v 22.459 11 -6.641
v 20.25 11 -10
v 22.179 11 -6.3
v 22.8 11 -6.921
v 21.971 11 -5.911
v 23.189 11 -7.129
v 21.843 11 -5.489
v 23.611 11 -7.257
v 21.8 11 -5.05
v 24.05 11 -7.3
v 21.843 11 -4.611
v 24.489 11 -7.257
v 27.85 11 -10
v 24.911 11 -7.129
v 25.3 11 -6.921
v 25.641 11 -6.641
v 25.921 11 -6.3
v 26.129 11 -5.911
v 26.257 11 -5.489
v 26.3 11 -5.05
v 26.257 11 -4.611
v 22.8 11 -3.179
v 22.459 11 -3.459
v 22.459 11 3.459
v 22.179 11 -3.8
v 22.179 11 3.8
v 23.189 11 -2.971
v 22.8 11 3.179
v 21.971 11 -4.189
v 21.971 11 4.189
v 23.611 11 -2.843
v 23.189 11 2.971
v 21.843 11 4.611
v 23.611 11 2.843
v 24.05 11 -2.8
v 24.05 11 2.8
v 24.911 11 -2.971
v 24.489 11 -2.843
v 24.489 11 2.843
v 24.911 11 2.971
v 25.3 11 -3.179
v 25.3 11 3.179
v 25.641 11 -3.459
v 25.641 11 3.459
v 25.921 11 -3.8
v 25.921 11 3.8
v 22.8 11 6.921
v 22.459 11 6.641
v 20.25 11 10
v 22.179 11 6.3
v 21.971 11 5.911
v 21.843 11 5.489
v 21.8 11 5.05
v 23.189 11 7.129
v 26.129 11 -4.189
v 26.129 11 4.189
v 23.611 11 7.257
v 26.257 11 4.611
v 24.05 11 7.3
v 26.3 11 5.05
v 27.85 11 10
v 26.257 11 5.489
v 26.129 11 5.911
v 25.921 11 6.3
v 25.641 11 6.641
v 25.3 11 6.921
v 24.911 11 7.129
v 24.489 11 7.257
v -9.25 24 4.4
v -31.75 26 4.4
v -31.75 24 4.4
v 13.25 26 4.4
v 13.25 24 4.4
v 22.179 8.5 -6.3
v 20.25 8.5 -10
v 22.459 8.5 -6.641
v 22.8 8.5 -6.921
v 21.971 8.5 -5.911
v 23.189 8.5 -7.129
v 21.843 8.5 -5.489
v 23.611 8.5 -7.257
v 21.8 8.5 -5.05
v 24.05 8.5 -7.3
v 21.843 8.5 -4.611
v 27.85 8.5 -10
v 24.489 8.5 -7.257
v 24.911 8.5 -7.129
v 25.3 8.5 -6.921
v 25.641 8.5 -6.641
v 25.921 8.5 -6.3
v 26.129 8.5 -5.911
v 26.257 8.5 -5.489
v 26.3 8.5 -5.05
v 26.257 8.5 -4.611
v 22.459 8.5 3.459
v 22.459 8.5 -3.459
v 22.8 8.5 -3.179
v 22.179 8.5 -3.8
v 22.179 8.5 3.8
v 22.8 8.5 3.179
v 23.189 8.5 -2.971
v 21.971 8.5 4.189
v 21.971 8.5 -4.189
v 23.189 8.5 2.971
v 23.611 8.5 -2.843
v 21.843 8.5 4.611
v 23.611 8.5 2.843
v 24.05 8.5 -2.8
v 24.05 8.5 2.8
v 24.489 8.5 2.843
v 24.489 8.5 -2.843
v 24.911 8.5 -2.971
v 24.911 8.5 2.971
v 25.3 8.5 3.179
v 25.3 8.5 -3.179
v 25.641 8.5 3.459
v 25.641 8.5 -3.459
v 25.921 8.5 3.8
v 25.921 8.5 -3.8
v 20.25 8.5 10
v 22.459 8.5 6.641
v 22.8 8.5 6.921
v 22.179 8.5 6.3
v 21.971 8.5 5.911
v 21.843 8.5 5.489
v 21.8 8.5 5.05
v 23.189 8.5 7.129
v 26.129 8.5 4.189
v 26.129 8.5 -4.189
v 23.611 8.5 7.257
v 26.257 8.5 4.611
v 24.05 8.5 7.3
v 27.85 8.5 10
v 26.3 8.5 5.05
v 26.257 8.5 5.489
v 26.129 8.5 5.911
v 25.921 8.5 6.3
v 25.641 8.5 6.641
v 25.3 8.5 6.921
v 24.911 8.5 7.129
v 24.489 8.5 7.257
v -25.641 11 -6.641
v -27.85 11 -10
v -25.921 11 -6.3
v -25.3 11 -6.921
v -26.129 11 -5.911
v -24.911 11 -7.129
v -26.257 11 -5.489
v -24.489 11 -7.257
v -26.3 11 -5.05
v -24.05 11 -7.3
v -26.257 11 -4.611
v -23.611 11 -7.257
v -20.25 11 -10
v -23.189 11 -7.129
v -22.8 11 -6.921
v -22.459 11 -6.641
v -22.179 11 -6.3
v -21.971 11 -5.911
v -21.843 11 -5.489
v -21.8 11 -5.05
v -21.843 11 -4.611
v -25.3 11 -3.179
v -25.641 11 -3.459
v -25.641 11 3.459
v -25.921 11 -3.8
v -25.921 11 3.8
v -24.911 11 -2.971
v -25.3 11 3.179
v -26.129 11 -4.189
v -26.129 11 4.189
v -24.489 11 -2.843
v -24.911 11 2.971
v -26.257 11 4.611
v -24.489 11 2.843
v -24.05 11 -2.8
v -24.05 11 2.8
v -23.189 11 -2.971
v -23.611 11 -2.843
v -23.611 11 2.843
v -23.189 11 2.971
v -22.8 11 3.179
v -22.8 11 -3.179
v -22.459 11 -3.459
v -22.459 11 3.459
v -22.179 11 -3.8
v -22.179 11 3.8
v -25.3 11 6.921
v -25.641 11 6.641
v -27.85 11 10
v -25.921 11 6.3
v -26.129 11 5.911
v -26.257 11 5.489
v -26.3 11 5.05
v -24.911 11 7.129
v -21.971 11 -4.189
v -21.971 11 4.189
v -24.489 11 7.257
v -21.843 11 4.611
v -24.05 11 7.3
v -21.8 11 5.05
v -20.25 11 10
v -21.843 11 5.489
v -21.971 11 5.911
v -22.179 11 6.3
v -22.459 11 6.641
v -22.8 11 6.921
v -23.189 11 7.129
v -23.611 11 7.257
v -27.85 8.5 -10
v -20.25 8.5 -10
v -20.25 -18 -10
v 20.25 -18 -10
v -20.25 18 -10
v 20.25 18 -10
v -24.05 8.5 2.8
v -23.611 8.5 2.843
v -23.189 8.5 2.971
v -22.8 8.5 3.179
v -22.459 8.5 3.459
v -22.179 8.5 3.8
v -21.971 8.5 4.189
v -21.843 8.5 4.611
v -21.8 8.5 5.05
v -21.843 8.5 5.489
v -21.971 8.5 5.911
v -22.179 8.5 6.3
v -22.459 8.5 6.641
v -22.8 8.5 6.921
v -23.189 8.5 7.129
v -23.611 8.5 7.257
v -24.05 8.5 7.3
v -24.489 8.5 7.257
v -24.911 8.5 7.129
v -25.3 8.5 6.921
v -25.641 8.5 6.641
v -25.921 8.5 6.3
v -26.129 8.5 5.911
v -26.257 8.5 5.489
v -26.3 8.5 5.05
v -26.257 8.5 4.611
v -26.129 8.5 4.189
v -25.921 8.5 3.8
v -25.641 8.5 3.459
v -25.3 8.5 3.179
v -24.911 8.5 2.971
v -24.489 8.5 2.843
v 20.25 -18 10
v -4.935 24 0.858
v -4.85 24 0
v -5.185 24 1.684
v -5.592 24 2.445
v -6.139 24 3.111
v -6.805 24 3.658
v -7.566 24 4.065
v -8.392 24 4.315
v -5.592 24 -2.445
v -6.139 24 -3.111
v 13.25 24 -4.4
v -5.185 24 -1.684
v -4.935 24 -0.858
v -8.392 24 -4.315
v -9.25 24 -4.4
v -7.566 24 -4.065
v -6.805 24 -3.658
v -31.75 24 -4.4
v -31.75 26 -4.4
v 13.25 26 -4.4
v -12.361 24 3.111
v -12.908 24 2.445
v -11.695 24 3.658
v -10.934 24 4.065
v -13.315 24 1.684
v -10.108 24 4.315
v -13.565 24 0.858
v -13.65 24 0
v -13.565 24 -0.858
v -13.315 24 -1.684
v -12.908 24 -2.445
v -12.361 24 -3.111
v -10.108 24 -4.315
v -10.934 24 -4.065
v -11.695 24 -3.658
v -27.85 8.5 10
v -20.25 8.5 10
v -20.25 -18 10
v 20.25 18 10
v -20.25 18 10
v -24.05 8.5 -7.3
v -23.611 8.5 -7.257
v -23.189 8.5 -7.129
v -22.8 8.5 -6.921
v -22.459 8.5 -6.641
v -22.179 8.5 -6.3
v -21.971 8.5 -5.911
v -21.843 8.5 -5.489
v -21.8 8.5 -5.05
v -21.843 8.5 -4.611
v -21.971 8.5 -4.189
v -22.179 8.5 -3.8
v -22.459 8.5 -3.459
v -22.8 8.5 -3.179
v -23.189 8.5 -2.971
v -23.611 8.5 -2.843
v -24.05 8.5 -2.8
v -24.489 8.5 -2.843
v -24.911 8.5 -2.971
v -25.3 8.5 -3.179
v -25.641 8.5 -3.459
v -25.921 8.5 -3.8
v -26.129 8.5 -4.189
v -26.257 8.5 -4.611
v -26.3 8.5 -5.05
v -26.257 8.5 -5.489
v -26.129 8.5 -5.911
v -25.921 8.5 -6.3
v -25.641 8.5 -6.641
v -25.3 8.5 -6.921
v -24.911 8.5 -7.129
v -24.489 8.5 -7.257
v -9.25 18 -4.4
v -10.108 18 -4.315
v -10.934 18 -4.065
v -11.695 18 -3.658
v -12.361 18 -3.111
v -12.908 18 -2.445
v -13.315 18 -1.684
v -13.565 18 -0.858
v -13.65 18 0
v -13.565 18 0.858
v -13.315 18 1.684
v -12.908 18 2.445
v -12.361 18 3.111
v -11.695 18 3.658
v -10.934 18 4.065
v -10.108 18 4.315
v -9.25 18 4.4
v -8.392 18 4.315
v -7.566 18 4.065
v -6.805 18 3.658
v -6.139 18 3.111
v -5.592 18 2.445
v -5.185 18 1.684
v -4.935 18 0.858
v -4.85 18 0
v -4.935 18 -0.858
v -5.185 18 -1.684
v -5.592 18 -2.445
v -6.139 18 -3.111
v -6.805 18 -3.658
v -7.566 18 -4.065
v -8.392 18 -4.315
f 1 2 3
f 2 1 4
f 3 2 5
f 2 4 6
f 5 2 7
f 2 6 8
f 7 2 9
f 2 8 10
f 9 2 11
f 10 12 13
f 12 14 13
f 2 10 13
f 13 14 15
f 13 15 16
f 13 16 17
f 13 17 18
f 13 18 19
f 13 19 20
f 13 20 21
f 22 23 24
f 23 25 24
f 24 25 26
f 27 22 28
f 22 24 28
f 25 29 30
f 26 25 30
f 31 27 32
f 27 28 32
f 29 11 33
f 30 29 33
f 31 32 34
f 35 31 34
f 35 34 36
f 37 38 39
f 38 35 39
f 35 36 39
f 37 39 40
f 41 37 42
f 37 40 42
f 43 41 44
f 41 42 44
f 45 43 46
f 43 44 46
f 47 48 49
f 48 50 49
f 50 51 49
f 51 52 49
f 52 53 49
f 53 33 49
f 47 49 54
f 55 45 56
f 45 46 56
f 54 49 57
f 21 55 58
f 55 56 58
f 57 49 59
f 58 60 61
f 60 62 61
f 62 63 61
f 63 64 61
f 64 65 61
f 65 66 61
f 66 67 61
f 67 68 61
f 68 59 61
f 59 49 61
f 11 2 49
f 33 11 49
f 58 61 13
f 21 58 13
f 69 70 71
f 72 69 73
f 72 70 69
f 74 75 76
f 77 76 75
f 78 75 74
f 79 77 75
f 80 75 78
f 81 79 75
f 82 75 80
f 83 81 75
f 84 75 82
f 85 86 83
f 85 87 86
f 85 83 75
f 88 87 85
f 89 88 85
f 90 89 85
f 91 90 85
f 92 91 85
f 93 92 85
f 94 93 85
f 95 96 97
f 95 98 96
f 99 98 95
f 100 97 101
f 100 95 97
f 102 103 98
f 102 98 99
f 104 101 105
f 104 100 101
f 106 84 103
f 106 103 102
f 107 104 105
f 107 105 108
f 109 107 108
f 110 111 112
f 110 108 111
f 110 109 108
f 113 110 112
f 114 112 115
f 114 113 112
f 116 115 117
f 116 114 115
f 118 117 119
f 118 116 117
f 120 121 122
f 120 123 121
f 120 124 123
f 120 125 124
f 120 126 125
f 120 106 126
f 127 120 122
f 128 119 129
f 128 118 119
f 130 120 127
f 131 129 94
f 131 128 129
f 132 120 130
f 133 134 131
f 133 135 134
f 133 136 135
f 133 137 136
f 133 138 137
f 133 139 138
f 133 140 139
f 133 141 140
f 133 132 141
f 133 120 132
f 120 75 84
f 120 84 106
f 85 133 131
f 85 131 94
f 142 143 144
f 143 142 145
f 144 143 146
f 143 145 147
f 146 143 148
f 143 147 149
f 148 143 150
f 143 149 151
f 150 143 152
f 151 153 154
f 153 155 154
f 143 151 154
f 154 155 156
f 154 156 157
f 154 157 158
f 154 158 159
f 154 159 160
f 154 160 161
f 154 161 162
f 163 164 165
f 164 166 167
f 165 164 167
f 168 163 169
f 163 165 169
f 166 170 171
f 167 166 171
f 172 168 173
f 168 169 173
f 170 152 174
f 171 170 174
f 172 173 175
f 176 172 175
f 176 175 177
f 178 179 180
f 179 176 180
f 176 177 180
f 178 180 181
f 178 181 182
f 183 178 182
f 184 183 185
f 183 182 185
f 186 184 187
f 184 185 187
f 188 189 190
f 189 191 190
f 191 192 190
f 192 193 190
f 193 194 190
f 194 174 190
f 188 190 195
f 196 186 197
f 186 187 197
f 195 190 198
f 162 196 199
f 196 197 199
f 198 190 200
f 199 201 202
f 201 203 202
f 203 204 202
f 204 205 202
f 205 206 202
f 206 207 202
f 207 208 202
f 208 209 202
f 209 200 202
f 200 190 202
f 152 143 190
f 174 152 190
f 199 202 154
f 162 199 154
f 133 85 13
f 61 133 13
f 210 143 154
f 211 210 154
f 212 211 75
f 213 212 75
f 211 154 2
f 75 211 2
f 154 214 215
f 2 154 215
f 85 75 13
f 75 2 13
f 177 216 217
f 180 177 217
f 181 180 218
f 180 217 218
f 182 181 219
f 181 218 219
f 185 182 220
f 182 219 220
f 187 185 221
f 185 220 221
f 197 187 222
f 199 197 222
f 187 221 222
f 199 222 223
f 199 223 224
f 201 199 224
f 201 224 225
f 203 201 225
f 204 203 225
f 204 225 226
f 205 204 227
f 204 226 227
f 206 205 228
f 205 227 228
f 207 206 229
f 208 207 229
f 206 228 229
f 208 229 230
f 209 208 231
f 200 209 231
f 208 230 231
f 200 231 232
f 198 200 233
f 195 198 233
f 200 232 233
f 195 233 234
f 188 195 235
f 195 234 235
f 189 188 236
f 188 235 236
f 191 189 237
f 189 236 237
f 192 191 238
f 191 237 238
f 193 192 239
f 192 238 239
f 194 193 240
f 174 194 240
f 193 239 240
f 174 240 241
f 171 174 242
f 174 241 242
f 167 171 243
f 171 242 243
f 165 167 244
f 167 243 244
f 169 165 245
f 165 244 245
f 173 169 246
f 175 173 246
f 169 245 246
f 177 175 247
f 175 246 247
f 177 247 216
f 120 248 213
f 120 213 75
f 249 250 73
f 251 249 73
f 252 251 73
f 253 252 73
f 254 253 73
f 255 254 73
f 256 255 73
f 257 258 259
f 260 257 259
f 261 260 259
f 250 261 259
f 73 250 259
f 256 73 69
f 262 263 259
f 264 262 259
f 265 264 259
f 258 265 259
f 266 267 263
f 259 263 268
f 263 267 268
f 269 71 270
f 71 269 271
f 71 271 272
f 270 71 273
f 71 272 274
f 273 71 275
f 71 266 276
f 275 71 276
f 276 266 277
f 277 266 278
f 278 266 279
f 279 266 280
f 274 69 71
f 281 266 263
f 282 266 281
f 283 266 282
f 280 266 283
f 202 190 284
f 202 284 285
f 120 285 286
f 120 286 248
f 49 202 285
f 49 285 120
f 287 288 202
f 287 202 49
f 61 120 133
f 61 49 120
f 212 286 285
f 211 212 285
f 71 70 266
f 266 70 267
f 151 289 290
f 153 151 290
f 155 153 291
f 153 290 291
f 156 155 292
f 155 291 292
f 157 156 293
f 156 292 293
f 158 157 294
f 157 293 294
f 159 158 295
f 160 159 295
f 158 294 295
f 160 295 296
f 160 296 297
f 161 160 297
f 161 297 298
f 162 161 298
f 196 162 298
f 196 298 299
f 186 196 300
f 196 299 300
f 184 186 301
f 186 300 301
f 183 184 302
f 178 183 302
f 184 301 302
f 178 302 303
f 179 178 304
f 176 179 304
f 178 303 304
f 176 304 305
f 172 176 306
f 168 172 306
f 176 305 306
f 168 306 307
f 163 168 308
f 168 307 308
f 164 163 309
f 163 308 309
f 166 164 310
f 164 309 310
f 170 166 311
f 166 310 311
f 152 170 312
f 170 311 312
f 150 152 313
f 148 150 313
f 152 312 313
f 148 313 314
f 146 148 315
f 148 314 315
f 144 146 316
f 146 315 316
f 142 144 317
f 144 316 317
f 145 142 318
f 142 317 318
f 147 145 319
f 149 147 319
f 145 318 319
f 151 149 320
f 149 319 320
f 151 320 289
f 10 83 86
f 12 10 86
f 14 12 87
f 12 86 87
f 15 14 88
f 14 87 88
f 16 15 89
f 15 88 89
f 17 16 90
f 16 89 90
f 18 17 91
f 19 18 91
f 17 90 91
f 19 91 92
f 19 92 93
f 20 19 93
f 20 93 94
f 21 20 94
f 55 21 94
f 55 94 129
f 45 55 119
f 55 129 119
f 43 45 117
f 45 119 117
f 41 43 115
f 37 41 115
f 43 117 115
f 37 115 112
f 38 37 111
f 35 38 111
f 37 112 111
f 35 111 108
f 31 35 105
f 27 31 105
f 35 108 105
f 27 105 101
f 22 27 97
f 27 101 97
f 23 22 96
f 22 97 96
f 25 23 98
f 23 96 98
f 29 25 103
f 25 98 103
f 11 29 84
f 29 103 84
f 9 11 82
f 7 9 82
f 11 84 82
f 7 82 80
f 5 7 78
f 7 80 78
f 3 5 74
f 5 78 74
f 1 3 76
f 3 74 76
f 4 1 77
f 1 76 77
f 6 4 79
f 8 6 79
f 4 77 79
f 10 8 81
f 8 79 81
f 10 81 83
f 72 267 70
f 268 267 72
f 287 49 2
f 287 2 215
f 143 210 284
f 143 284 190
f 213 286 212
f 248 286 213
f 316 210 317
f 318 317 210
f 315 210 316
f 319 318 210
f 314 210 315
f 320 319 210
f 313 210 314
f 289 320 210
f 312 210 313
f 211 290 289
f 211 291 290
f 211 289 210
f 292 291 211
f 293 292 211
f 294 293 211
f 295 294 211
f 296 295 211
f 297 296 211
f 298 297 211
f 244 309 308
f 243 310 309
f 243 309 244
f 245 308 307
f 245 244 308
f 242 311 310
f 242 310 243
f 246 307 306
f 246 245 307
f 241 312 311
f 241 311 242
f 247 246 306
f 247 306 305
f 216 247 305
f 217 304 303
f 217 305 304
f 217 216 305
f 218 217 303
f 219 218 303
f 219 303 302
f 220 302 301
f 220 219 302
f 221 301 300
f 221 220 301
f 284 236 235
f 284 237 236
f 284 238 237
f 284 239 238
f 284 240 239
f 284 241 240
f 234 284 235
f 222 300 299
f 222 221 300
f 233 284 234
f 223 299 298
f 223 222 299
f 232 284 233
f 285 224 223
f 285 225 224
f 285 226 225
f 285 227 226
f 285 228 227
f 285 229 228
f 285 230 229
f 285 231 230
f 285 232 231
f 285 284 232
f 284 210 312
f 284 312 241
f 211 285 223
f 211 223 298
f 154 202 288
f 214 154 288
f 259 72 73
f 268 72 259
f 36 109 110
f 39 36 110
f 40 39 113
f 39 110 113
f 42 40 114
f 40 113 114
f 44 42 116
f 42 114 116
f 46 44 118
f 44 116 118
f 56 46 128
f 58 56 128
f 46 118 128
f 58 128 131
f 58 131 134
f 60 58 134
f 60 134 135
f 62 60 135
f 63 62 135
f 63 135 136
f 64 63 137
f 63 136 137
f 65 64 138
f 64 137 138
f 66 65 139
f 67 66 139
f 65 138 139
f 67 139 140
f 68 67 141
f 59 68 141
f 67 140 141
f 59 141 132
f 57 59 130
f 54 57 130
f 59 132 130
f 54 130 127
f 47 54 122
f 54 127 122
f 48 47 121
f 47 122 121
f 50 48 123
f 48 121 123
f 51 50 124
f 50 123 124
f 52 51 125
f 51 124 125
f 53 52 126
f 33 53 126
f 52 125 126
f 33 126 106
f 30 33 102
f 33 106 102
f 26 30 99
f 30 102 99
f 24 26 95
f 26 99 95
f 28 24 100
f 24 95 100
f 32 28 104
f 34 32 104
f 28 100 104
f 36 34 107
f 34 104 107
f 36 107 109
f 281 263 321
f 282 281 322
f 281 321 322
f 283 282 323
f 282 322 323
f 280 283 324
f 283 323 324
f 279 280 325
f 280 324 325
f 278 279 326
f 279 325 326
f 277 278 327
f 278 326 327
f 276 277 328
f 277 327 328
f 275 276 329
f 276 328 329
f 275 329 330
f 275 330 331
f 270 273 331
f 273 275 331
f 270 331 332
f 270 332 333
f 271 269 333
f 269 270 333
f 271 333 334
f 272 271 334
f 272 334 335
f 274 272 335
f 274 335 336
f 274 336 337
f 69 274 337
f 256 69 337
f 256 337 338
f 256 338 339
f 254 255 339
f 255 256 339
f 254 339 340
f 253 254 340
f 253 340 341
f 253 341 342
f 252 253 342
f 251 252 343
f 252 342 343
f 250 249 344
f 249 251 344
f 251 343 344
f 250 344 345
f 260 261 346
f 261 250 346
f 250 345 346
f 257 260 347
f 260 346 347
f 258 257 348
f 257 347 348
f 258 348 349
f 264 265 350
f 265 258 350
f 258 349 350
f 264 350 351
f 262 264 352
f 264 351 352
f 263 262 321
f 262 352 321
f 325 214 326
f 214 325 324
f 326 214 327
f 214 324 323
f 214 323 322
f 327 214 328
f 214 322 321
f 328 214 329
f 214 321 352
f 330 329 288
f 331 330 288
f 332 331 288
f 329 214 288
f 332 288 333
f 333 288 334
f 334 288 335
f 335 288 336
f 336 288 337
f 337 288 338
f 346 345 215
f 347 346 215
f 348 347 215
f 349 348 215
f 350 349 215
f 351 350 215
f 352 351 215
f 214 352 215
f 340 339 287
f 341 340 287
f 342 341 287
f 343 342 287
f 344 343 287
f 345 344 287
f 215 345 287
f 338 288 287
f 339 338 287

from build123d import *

# Parameters (mm, degrees)
SKETCH1_W           = 40.5
SKETCH1_H           = 36
BOSS_EXTRUDE1_DEPTH = 10
SKETCH2_W           = 55.7
SKETCH2_H           = 2.5
BOSS_EXTRUDE2_DEPTH = 20
SKETCH3_R           = 4.4
BOSS_EXTRUDE3_DEPTH = 8
SKETCH4_W           = 45
SKETCH4_H           = 8.8
BOSS_EXTRUDE4_DEPTH = 2
SKETCH5_R           = 2.25
CUT_EXTRUDE1_DEPTH  = 2.5


with BuildPart() as part:
    # Sketch1 → Boss-Extrude1 (new, symmetric)
    with BuildSketch(Plane.XY):
        Rectangle(SKETCH1_W, SKETCH1_H)
    extrude(amount=BOSS_EXTRUDE1_DEPTH, both=True)

    # Sketch2 → Boss-Extrude2 (add)
    with BuildSketch(Plane.XY.offset(10)):
        with Locations((0, 9.75)):
            Rectangle(SKETCH2_W, SKETCH2_H)
    extrude(amount=-BOSS_EXTRUDE2_DEPTH)

    # Sketch3 → Boss-Extrude3 (add)
    with BuildSketch(Plane(origin=(0, 18, 0), x_dir=(1, 0, 0), z_dir=(0, 1, 0))):
        with Locations(Location((-9.25, 0, 0), (0, 0, 90))):
            Circle(SKETCH3_R)
    extrude(amount=BOSS_EXTRUDE3_DEPTH)

    # Sketch4 → Boss-Extrude4 (add)
    with BuildSketch(Plane(origin=(0, 26, 0), x_dir=(1, 0, 0), z_dir=(0, 1, 0))):
        with Locations((-9.25, 0)):
            Rectangle(SKETCH4_W, SKETCH4_H)
    extrude(amount=-BOSS_EXTRUDE4_DEPTH)

    # Sketch5 → Cut-Extrude1 (cut)
    with BuildSketch(Plane.XZ.offset(-8.5)):
        with Locations(Location((-24.05, -5.05, 0), (0, 0, 270))):
            Circle(SKETCH5_R)
        with Locations(Location((-24.05, 5.05, 0), (0, 0, 270))):
            Circle(SKETCH5_R)
        with Locations(Location((24.05, -5.05, 0), (0, 0, 270))):
            Circle(SKETCH5_R)
        with Locations(Location((24.05, 5.05, 0), (0, 0, 270))):
            Circle(SKETCH5_R)
    extrude(amount=-CUT_EXTRUDE1_DEPTH, mode=Mode.SUBTRACT)


solid = part.part
